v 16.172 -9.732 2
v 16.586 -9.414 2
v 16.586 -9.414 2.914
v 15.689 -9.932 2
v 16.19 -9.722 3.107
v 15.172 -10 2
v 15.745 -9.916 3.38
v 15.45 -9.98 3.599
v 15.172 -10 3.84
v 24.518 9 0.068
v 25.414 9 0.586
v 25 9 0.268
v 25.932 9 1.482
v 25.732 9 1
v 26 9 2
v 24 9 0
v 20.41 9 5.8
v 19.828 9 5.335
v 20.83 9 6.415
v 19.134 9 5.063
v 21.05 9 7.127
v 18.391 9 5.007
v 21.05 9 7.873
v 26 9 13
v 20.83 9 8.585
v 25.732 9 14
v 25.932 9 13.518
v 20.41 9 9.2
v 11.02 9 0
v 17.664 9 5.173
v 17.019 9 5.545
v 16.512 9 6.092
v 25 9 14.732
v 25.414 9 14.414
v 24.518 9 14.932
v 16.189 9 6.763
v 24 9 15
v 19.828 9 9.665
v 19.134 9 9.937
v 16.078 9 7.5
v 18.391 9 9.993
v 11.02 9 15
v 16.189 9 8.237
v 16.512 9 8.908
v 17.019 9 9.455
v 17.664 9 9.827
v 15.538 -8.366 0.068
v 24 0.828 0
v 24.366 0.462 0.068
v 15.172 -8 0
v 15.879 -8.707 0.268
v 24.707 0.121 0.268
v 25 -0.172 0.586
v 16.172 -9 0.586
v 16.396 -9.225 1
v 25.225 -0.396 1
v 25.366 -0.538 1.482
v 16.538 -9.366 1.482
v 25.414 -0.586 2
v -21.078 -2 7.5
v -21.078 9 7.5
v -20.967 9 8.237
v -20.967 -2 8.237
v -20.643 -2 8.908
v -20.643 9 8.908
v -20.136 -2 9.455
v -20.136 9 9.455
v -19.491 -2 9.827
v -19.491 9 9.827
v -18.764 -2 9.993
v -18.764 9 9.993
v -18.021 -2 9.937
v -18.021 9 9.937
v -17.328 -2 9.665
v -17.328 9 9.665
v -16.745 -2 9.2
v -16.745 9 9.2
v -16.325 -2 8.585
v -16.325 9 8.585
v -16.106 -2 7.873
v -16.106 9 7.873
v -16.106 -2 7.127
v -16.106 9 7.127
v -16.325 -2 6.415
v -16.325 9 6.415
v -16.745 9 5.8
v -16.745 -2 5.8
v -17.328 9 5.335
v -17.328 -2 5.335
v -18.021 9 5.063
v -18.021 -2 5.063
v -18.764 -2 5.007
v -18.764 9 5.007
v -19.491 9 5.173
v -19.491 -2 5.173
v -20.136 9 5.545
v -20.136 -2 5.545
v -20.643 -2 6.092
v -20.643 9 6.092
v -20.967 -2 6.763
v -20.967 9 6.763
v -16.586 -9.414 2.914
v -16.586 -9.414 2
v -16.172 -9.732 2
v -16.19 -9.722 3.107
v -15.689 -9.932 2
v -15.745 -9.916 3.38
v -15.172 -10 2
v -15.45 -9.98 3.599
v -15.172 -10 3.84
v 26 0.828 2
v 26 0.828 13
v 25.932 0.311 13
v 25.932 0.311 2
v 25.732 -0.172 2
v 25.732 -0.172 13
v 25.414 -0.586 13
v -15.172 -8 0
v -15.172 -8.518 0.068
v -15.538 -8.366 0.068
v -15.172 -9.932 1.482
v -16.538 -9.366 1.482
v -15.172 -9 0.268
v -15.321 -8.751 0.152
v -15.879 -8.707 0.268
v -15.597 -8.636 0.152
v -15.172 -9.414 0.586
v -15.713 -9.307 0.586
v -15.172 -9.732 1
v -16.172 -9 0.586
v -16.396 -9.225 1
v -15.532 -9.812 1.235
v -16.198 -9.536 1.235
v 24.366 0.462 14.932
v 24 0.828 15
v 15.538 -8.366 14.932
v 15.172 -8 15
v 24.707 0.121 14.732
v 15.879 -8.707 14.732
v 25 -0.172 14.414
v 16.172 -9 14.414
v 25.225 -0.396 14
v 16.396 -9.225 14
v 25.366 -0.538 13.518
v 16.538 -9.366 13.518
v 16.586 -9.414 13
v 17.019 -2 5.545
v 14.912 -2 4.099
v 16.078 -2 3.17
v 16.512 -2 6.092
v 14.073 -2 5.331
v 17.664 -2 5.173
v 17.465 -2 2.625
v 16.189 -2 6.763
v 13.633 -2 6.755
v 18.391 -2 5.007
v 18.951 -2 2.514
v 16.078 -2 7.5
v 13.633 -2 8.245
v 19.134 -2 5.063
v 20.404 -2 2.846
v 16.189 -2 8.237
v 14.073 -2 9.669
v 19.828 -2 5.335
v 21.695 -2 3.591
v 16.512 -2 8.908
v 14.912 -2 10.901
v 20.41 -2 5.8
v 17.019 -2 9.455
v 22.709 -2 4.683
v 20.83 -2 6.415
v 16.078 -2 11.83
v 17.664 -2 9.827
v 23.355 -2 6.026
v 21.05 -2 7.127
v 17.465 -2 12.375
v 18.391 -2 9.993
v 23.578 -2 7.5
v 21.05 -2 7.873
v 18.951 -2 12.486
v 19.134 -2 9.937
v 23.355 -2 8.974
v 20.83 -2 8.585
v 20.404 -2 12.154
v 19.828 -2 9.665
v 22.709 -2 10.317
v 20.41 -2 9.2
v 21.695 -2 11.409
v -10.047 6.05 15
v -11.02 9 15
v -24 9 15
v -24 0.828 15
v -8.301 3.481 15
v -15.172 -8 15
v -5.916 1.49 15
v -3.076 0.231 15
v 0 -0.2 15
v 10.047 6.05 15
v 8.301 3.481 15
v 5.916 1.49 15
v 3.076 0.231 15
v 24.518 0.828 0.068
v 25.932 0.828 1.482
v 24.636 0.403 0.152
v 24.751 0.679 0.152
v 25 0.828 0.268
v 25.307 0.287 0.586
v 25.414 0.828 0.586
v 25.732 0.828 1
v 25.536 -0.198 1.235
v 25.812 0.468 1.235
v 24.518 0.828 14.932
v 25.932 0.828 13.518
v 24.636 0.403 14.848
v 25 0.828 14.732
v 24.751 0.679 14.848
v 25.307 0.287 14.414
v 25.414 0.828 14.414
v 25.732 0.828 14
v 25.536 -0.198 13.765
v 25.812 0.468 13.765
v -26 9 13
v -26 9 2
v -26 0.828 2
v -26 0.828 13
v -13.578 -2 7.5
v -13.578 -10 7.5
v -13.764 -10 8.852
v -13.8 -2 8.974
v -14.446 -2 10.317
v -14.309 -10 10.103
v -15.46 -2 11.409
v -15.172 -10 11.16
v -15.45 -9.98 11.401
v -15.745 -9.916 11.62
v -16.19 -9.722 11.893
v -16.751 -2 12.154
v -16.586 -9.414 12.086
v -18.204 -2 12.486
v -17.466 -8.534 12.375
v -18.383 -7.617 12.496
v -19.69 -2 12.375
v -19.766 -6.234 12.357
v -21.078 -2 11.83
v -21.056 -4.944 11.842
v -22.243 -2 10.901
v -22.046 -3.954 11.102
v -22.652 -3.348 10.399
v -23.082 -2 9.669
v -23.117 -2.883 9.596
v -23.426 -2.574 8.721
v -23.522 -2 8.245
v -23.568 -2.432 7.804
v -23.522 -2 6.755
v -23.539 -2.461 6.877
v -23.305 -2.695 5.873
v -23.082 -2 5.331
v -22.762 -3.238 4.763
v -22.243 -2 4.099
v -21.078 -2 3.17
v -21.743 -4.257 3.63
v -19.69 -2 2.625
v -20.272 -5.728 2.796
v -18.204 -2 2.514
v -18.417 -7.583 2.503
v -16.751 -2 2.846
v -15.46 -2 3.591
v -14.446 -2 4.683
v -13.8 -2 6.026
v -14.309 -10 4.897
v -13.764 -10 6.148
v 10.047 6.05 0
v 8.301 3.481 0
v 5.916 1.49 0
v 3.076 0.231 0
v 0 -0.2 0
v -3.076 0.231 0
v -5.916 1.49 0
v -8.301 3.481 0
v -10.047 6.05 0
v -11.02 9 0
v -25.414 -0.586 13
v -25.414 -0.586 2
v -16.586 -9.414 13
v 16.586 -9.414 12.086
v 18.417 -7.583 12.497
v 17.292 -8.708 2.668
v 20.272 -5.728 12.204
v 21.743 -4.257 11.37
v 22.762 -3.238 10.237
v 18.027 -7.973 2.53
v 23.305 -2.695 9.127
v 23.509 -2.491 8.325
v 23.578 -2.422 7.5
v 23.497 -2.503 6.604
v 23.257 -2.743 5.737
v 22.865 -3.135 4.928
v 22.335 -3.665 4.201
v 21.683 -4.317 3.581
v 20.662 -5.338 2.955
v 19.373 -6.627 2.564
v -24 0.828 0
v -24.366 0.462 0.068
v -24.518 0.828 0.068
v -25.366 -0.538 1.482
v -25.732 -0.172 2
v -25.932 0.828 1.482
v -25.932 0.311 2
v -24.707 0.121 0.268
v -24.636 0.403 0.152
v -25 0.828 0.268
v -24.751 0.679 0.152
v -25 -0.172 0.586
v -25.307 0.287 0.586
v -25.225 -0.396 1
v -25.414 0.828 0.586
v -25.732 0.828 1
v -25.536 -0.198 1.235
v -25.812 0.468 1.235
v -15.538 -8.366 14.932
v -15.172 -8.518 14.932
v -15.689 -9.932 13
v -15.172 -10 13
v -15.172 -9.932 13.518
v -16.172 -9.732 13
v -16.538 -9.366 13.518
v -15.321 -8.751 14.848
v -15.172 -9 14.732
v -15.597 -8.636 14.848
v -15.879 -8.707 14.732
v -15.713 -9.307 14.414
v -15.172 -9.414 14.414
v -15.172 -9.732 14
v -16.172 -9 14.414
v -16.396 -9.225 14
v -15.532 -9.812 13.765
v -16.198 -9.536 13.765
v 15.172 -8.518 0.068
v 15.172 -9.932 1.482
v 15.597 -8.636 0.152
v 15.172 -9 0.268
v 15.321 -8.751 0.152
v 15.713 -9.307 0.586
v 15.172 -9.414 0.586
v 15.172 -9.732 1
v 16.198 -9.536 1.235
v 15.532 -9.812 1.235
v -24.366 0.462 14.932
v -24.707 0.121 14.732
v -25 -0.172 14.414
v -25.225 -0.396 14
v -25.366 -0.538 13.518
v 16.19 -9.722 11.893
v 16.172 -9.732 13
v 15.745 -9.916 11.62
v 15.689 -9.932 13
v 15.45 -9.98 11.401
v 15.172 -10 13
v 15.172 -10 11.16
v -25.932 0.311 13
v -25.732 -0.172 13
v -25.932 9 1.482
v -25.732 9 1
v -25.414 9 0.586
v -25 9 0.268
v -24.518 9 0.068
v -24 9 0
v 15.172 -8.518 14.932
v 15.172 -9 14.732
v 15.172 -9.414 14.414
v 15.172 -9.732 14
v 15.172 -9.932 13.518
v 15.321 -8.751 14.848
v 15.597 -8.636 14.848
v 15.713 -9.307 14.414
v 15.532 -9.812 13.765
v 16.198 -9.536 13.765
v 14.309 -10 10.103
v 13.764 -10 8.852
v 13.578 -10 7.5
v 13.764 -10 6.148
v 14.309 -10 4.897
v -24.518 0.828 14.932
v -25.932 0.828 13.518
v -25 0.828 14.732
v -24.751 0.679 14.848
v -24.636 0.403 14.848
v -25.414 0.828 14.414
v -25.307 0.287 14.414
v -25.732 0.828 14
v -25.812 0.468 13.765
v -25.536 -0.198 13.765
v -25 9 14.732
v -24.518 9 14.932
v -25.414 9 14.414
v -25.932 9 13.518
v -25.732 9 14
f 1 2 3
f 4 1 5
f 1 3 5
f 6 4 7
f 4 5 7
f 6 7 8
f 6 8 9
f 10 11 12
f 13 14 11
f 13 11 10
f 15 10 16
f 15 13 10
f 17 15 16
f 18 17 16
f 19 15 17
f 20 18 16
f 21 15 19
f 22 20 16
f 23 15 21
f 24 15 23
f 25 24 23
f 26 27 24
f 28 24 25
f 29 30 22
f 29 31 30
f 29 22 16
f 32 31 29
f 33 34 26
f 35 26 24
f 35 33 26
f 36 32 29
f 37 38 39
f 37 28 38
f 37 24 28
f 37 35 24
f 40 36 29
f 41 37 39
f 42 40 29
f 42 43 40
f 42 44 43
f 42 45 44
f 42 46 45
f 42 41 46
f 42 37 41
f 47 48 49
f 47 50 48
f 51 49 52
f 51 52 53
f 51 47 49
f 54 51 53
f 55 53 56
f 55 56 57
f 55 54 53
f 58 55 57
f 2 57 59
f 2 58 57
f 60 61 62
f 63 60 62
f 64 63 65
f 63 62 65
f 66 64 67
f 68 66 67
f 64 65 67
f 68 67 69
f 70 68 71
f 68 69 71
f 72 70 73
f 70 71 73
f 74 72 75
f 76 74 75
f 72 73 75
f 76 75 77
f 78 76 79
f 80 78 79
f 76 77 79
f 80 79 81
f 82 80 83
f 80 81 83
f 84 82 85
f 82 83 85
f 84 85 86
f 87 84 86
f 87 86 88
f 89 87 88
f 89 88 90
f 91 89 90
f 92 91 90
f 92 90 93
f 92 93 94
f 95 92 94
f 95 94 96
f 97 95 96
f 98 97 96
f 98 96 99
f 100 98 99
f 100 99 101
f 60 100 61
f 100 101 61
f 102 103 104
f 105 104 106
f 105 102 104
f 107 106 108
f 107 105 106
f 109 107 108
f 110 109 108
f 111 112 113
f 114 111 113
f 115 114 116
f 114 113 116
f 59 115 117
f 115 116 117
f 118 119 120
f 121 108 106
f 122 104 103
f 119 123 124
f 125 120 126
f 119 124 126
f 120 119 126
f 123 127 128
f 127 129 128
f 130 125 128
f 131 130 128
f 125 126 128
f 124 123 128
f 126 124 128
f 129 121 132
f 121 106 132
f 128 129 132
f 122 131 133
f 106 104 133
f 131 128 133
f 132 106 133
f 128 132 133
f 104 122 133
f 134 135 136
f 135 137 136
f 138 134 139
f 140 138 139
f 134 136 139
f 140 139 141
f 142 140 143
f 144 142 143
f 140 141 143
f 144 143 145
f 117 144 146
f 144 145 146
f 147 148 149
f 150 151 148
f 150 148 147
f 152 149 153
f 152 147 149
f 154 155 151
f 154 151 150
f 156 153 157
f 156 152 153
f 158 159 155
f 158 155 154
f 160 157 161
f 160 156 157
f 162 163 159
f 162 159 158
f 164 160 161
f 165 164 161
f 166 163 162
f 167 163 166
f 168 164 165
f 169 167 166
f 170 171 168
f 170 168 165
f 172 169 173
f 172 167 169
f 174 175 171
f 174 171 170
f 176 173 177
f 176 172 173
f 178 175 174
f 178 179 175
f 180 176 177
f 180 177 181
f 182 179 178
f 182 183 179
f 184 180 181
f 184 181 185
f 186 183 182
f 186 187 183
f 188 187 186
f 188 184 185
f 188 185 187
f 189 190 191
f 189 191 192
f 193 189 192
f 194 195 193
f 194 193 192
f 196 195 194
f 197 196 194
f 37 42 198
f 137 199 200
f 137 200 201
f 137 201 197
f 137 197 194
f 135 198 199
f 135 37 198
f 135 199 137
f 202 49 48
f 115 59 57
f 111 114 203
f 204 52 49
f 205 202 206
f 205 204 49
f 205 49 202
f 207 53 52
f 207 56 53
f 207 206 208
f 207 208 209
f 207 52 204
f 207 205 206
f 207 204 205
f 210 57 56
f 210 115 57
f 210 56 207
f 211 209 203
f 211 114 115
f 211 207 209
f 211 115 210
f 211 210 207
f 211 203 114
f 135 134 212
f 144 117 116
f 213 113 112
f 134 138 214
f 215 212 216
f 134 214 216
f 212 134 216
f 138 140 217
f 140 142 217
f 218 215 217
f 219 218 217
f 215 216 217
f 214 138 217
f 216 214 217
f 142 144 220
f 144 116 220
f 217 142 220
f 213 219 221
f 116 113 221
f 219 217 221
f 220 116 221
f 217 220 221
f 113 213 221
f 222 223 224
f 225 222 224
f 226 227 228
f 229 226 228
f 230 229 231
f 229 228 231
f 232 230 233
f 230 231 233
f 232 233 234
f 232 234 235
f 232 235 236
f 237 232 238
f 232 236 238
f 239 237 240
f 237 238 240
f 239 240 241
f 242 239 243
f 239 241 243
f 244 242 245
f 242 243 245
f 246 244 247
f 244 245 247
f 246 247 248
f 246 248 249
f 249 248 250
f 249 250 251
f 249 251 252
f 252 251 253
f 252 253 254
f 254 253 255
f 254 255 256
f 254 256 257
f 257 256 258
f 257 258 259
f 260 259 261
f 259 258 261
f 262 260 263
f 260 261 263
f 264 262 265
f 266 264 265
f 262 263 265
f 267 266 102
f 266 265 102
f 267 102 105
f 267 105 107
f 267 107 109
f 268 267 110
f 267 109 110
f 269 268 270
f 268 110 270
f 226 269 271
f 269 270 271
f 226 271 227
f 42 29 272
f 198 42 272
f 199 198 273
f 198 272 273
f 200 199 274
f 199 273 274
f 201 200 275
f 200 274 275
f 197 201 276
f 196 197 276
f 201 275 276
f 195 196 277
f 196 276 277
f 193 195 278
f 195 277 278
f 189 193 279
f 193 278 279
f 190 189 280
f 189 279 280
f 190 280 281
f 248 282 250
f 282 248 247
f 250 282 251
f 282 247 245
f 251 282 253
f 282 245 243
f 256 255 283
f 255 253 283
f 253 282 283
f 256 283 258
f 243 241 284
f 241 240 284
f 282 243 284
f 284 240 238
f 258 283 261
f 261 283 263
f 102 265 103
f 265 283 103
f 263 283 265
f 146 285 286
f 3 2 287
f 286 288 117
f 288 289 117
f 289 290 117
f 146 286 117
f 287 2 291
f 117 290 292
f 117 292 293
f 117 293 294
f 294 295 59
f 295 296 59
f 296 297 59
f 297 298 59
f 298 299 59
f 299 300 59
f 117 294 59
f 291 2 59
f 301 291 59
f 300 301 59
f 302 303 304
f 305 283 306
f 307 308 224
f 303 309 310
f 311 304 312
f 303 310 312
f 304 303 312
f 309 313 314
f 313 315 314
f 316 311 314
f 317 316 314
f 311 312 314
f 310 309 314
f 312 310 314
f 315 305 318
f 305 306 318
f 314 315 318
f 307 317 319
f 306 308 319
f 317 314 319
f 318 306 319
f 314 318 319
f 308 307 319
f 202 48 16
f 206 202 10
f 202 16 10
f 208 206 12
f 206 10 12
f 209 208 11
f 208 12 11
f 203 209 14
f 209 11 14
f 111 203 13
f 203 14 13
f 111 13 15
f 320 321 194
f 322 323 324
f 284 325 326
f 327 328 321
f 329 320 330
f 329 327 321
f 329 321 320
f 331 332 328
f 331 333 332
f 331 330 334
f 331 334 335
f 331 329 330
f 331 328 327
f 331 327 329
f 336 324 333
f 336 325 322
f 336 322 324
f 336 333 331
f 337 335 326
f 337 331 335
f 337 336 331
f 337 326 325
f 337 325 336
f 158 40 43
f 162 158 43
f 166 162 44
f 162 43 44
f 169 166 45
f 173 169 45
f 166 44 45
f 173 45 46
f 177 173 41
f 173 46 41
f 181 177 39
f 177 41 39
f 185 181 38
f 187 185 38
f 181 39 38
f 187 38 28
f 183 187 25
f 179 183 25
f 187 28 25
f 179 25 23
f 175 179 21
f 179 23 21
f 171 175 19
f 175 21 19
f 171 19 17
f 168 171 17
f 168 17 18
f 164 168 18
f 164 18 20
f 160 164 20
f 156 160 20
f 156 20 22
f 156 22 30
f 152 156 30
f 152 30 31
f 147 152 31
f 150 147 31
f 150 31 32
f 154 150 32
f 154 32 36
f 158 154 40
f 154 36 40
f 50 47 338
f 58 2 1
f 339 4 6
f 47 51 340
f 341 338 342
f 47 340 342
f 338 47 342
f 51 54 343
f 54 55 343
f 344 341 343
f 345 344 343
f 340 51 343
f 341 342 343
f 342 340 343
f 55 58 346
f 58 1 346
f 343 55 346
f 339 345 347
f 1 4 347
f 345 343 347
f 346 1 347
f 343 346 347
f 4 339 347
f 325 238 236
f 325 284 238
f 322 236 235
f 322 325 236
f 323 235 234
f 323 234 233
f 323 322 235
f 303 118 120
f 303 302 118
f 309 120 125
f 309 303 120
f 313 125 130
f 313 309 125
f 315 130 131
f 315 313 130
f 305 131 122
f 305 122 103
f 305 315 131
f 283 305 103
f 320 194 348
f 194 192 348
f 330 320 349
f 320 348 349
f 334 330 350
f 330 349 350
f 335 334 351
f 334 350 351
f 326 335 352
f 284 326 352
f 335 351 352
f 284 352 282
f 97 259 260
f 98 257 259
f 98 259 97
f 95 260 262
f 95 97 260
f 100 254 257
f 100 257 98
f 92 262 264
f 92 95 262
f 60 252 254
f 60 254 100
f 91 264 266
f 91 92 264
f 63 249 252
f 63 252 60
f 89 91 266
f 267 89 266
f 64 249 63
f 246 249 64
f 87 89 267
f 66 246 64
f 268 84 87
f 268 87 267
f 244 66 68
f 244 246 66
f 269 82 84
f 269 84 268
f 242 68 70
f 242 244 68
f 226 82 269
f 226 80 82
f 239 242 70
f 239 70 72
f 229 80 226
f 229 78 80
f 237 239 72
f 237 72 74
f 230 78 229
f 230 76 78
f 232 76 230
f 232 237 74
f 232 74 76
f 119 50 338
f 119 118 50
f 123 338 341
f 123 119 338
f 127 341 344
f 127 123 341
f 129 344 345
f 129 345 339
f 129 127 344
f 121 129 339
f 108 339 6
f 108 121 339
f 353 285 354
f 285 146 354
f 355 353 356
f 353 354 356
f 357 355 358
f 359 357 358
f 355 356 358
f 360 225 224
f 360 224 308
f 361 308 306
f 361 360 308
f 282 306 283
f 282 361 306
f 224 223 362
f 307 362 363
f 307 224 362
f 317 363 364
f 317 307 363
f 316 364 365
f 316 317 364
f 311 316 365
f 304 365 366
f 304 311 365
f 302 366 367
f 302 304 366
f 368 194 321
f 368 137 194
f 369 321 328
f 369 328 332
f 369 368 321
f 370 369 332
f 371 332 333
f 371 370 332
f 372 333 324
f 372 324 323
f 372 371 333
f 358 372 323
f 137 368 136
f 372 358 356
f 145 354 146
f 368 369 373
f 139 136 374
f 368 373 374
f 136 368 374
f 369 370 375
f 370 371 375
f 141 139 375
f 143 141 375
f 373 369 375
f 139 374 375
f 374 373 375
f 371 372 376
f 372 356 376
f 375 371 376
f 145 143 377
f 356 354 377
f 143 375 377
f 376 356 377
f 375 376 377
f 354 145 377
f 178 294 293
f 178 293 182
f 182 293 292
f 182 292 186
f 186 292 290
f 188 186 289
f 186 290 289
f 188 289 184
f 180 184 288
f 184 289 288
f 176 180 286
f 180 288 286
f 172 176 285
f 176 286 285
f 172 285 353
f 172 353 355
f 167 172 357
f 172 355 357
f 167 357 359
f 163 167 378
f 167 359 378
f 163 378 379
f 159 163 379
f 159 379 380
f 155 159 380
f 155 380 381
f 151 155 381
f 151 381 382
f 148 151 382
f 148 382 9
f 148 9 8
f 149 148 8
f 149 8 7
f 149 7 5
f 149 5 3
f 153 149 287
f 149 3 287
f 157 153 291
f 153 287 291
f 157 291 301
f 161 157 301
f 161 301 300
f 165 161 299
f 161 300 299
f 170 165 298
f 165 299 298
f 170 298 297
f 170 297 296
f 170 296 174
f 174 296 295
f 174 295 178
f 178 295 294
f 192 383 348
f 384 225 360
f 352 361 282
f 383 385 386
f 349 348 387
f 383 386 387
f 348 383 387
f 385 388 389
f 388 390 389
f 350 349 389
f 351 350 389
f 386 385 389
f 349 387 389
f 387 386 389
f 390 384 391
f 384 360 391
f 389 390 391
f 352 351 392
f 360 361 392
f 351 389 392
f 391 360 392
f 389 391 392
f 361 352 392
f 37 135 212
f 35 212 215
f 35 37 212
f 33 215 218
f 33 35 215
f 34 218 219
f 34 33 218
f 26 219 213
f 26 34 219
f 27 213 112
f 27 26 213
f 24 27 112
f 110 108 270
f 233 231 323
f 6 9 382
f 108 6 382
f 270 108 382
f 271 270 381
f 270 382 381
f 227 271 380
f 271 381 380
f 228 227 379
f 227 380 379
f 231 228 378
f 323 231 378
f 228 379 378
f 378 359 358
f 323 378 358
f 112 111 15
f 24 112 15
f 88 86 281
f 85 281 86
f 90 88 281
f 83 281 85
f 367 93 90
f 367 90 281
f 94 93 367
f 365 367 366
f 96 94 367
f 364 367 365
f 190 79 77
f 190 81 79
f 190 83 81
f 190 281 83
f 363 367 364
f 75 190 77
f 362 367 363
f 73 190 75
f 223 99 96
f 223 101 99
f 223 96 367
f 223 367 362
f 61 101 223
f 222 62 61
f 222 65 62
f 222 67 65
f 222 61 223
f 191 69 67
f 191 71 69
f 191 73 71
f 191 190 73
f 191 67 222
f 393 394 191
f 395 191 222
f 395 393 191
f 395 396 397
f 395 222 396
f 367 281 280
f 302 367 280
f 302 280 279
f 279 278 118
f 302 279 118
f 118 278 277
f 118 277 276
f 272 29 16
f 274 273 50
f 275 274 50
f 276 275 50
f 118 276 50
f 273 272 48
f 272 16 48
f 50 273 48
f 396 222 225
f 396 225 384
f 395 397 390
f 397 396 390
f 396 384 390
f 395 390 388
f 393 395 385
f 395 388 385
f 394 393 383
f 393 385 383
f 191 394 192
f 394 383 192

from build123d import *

# Parameters (mm, degrees)
F1_DEPTH       = 15
F2_DEPTH       = 5
F3_DEPTH       = 5
F5_D           = 5
F5_CBORE_D     = 10
F5_CBORE_DEPTH = 8
F6_T1_DEPTH    = 66.4336597593
F7_R           = 2
F8_W           = 54.7069119513
F8_H           = 16.1263942719
F9_DEPTH       = 1


# Not quite as in the source:
# - a fillet or chamfer that OpenCascade refuses, or shapes differently, is made with other operations: its cross-section is extruded or revolved along the edge and cut away or added


with BuildPart() as f1:
    # F0 (on Top) → F1 (new body)
    with BuildSketch(Plane.XY):
        with BuildLine():
            Line((-21, -10), (21, -10))
            Line((21, -10), (21, 10))
            Line((21, 10), (11.1552678139, 10))
            ThreePointArc((11.1552678139, 10), (0, -0.2), (-11.1552678139, 10))
            Line((-11.1552678139, 10), (-21, 10))
            Line((-21, 10), (-21, -10))
        make_face()
    extrude(amount=F1_DEPTH)

    # F2 (add): a face of the model
    f2_faces = [f1.faces().sort_by_distance(p)[0] for p in [
        (21, 0, 7.5),
    ]]
    extrude(f2_faces, amount=F2_DEPTH)

    # F3 (add): a face of the model
    f3_faces = [f1.faces().sort_by_distance(p)[0] for p in [
        (-21, 0, 7.5),
    ]]
    extrude(f3_faces, amount=F3_DEPTH)

    # F5 (through all)
    with Locations(Plane.XZ.offset(10)):
        with Locations((18.577633907, 7.5), (-18.577633907, 7.5)):
            CounterBoreHole(F5_D / 2, F5_CBORE_D / 2, F5_CBORE_DEPTH)

    # F6: chamfer of 10 on 2 edges, made by hand

    # F6_s2 → F6_t1 (cut)
    with BuildSketch(Plane.XY.offset(-25.7168298797)):
        Polygon((16, -10), (26, 0), (26, -10), align=None)
        Polygon((-26, 0), (-16, -10), (-26, -10), align=None)
    extrude(amount=F6_T1_DEPTH, mode=Mode.SUBTRACT)

    # F7
    f7_edges = [f1.edges().sort_by_distance(p)[0] for p in [
        (0, -10, 15),
        (21, -5, 15),
        (-26, 5, 15),
        (26, 5, 15),
        (-21, -5, 15),
        (21, -5, 0),
        (0, -10, 0),
        (-21, -5, 0),
        (26, 5, 0),
        (-26, 5, 0),
        (16, -10, 13.392184),
        (16, -10, 1.607816),
        (-16, -10, 1.607816),
        (-16, -10, 13.392184),
        (26, 0, 7.5),
        (-26, 0, 7.5),
    ]]
    fillet(f7_edges, radius=F7_R)

    # F8 (on face) → F9 (cut)
    with BuildSketch(Plane(origin=(0, 10, 0), x_dir=(-1, 0, 0), z_dir=(0, 1, 0))):
        with Locations((-1.3534559757, 8.0631971359)):
            Rectangle(F8_W, F8_H)
    extrude(amount=-F9_DEPTH, mode=Mode.SUBTRACT)


solid = f1.part
